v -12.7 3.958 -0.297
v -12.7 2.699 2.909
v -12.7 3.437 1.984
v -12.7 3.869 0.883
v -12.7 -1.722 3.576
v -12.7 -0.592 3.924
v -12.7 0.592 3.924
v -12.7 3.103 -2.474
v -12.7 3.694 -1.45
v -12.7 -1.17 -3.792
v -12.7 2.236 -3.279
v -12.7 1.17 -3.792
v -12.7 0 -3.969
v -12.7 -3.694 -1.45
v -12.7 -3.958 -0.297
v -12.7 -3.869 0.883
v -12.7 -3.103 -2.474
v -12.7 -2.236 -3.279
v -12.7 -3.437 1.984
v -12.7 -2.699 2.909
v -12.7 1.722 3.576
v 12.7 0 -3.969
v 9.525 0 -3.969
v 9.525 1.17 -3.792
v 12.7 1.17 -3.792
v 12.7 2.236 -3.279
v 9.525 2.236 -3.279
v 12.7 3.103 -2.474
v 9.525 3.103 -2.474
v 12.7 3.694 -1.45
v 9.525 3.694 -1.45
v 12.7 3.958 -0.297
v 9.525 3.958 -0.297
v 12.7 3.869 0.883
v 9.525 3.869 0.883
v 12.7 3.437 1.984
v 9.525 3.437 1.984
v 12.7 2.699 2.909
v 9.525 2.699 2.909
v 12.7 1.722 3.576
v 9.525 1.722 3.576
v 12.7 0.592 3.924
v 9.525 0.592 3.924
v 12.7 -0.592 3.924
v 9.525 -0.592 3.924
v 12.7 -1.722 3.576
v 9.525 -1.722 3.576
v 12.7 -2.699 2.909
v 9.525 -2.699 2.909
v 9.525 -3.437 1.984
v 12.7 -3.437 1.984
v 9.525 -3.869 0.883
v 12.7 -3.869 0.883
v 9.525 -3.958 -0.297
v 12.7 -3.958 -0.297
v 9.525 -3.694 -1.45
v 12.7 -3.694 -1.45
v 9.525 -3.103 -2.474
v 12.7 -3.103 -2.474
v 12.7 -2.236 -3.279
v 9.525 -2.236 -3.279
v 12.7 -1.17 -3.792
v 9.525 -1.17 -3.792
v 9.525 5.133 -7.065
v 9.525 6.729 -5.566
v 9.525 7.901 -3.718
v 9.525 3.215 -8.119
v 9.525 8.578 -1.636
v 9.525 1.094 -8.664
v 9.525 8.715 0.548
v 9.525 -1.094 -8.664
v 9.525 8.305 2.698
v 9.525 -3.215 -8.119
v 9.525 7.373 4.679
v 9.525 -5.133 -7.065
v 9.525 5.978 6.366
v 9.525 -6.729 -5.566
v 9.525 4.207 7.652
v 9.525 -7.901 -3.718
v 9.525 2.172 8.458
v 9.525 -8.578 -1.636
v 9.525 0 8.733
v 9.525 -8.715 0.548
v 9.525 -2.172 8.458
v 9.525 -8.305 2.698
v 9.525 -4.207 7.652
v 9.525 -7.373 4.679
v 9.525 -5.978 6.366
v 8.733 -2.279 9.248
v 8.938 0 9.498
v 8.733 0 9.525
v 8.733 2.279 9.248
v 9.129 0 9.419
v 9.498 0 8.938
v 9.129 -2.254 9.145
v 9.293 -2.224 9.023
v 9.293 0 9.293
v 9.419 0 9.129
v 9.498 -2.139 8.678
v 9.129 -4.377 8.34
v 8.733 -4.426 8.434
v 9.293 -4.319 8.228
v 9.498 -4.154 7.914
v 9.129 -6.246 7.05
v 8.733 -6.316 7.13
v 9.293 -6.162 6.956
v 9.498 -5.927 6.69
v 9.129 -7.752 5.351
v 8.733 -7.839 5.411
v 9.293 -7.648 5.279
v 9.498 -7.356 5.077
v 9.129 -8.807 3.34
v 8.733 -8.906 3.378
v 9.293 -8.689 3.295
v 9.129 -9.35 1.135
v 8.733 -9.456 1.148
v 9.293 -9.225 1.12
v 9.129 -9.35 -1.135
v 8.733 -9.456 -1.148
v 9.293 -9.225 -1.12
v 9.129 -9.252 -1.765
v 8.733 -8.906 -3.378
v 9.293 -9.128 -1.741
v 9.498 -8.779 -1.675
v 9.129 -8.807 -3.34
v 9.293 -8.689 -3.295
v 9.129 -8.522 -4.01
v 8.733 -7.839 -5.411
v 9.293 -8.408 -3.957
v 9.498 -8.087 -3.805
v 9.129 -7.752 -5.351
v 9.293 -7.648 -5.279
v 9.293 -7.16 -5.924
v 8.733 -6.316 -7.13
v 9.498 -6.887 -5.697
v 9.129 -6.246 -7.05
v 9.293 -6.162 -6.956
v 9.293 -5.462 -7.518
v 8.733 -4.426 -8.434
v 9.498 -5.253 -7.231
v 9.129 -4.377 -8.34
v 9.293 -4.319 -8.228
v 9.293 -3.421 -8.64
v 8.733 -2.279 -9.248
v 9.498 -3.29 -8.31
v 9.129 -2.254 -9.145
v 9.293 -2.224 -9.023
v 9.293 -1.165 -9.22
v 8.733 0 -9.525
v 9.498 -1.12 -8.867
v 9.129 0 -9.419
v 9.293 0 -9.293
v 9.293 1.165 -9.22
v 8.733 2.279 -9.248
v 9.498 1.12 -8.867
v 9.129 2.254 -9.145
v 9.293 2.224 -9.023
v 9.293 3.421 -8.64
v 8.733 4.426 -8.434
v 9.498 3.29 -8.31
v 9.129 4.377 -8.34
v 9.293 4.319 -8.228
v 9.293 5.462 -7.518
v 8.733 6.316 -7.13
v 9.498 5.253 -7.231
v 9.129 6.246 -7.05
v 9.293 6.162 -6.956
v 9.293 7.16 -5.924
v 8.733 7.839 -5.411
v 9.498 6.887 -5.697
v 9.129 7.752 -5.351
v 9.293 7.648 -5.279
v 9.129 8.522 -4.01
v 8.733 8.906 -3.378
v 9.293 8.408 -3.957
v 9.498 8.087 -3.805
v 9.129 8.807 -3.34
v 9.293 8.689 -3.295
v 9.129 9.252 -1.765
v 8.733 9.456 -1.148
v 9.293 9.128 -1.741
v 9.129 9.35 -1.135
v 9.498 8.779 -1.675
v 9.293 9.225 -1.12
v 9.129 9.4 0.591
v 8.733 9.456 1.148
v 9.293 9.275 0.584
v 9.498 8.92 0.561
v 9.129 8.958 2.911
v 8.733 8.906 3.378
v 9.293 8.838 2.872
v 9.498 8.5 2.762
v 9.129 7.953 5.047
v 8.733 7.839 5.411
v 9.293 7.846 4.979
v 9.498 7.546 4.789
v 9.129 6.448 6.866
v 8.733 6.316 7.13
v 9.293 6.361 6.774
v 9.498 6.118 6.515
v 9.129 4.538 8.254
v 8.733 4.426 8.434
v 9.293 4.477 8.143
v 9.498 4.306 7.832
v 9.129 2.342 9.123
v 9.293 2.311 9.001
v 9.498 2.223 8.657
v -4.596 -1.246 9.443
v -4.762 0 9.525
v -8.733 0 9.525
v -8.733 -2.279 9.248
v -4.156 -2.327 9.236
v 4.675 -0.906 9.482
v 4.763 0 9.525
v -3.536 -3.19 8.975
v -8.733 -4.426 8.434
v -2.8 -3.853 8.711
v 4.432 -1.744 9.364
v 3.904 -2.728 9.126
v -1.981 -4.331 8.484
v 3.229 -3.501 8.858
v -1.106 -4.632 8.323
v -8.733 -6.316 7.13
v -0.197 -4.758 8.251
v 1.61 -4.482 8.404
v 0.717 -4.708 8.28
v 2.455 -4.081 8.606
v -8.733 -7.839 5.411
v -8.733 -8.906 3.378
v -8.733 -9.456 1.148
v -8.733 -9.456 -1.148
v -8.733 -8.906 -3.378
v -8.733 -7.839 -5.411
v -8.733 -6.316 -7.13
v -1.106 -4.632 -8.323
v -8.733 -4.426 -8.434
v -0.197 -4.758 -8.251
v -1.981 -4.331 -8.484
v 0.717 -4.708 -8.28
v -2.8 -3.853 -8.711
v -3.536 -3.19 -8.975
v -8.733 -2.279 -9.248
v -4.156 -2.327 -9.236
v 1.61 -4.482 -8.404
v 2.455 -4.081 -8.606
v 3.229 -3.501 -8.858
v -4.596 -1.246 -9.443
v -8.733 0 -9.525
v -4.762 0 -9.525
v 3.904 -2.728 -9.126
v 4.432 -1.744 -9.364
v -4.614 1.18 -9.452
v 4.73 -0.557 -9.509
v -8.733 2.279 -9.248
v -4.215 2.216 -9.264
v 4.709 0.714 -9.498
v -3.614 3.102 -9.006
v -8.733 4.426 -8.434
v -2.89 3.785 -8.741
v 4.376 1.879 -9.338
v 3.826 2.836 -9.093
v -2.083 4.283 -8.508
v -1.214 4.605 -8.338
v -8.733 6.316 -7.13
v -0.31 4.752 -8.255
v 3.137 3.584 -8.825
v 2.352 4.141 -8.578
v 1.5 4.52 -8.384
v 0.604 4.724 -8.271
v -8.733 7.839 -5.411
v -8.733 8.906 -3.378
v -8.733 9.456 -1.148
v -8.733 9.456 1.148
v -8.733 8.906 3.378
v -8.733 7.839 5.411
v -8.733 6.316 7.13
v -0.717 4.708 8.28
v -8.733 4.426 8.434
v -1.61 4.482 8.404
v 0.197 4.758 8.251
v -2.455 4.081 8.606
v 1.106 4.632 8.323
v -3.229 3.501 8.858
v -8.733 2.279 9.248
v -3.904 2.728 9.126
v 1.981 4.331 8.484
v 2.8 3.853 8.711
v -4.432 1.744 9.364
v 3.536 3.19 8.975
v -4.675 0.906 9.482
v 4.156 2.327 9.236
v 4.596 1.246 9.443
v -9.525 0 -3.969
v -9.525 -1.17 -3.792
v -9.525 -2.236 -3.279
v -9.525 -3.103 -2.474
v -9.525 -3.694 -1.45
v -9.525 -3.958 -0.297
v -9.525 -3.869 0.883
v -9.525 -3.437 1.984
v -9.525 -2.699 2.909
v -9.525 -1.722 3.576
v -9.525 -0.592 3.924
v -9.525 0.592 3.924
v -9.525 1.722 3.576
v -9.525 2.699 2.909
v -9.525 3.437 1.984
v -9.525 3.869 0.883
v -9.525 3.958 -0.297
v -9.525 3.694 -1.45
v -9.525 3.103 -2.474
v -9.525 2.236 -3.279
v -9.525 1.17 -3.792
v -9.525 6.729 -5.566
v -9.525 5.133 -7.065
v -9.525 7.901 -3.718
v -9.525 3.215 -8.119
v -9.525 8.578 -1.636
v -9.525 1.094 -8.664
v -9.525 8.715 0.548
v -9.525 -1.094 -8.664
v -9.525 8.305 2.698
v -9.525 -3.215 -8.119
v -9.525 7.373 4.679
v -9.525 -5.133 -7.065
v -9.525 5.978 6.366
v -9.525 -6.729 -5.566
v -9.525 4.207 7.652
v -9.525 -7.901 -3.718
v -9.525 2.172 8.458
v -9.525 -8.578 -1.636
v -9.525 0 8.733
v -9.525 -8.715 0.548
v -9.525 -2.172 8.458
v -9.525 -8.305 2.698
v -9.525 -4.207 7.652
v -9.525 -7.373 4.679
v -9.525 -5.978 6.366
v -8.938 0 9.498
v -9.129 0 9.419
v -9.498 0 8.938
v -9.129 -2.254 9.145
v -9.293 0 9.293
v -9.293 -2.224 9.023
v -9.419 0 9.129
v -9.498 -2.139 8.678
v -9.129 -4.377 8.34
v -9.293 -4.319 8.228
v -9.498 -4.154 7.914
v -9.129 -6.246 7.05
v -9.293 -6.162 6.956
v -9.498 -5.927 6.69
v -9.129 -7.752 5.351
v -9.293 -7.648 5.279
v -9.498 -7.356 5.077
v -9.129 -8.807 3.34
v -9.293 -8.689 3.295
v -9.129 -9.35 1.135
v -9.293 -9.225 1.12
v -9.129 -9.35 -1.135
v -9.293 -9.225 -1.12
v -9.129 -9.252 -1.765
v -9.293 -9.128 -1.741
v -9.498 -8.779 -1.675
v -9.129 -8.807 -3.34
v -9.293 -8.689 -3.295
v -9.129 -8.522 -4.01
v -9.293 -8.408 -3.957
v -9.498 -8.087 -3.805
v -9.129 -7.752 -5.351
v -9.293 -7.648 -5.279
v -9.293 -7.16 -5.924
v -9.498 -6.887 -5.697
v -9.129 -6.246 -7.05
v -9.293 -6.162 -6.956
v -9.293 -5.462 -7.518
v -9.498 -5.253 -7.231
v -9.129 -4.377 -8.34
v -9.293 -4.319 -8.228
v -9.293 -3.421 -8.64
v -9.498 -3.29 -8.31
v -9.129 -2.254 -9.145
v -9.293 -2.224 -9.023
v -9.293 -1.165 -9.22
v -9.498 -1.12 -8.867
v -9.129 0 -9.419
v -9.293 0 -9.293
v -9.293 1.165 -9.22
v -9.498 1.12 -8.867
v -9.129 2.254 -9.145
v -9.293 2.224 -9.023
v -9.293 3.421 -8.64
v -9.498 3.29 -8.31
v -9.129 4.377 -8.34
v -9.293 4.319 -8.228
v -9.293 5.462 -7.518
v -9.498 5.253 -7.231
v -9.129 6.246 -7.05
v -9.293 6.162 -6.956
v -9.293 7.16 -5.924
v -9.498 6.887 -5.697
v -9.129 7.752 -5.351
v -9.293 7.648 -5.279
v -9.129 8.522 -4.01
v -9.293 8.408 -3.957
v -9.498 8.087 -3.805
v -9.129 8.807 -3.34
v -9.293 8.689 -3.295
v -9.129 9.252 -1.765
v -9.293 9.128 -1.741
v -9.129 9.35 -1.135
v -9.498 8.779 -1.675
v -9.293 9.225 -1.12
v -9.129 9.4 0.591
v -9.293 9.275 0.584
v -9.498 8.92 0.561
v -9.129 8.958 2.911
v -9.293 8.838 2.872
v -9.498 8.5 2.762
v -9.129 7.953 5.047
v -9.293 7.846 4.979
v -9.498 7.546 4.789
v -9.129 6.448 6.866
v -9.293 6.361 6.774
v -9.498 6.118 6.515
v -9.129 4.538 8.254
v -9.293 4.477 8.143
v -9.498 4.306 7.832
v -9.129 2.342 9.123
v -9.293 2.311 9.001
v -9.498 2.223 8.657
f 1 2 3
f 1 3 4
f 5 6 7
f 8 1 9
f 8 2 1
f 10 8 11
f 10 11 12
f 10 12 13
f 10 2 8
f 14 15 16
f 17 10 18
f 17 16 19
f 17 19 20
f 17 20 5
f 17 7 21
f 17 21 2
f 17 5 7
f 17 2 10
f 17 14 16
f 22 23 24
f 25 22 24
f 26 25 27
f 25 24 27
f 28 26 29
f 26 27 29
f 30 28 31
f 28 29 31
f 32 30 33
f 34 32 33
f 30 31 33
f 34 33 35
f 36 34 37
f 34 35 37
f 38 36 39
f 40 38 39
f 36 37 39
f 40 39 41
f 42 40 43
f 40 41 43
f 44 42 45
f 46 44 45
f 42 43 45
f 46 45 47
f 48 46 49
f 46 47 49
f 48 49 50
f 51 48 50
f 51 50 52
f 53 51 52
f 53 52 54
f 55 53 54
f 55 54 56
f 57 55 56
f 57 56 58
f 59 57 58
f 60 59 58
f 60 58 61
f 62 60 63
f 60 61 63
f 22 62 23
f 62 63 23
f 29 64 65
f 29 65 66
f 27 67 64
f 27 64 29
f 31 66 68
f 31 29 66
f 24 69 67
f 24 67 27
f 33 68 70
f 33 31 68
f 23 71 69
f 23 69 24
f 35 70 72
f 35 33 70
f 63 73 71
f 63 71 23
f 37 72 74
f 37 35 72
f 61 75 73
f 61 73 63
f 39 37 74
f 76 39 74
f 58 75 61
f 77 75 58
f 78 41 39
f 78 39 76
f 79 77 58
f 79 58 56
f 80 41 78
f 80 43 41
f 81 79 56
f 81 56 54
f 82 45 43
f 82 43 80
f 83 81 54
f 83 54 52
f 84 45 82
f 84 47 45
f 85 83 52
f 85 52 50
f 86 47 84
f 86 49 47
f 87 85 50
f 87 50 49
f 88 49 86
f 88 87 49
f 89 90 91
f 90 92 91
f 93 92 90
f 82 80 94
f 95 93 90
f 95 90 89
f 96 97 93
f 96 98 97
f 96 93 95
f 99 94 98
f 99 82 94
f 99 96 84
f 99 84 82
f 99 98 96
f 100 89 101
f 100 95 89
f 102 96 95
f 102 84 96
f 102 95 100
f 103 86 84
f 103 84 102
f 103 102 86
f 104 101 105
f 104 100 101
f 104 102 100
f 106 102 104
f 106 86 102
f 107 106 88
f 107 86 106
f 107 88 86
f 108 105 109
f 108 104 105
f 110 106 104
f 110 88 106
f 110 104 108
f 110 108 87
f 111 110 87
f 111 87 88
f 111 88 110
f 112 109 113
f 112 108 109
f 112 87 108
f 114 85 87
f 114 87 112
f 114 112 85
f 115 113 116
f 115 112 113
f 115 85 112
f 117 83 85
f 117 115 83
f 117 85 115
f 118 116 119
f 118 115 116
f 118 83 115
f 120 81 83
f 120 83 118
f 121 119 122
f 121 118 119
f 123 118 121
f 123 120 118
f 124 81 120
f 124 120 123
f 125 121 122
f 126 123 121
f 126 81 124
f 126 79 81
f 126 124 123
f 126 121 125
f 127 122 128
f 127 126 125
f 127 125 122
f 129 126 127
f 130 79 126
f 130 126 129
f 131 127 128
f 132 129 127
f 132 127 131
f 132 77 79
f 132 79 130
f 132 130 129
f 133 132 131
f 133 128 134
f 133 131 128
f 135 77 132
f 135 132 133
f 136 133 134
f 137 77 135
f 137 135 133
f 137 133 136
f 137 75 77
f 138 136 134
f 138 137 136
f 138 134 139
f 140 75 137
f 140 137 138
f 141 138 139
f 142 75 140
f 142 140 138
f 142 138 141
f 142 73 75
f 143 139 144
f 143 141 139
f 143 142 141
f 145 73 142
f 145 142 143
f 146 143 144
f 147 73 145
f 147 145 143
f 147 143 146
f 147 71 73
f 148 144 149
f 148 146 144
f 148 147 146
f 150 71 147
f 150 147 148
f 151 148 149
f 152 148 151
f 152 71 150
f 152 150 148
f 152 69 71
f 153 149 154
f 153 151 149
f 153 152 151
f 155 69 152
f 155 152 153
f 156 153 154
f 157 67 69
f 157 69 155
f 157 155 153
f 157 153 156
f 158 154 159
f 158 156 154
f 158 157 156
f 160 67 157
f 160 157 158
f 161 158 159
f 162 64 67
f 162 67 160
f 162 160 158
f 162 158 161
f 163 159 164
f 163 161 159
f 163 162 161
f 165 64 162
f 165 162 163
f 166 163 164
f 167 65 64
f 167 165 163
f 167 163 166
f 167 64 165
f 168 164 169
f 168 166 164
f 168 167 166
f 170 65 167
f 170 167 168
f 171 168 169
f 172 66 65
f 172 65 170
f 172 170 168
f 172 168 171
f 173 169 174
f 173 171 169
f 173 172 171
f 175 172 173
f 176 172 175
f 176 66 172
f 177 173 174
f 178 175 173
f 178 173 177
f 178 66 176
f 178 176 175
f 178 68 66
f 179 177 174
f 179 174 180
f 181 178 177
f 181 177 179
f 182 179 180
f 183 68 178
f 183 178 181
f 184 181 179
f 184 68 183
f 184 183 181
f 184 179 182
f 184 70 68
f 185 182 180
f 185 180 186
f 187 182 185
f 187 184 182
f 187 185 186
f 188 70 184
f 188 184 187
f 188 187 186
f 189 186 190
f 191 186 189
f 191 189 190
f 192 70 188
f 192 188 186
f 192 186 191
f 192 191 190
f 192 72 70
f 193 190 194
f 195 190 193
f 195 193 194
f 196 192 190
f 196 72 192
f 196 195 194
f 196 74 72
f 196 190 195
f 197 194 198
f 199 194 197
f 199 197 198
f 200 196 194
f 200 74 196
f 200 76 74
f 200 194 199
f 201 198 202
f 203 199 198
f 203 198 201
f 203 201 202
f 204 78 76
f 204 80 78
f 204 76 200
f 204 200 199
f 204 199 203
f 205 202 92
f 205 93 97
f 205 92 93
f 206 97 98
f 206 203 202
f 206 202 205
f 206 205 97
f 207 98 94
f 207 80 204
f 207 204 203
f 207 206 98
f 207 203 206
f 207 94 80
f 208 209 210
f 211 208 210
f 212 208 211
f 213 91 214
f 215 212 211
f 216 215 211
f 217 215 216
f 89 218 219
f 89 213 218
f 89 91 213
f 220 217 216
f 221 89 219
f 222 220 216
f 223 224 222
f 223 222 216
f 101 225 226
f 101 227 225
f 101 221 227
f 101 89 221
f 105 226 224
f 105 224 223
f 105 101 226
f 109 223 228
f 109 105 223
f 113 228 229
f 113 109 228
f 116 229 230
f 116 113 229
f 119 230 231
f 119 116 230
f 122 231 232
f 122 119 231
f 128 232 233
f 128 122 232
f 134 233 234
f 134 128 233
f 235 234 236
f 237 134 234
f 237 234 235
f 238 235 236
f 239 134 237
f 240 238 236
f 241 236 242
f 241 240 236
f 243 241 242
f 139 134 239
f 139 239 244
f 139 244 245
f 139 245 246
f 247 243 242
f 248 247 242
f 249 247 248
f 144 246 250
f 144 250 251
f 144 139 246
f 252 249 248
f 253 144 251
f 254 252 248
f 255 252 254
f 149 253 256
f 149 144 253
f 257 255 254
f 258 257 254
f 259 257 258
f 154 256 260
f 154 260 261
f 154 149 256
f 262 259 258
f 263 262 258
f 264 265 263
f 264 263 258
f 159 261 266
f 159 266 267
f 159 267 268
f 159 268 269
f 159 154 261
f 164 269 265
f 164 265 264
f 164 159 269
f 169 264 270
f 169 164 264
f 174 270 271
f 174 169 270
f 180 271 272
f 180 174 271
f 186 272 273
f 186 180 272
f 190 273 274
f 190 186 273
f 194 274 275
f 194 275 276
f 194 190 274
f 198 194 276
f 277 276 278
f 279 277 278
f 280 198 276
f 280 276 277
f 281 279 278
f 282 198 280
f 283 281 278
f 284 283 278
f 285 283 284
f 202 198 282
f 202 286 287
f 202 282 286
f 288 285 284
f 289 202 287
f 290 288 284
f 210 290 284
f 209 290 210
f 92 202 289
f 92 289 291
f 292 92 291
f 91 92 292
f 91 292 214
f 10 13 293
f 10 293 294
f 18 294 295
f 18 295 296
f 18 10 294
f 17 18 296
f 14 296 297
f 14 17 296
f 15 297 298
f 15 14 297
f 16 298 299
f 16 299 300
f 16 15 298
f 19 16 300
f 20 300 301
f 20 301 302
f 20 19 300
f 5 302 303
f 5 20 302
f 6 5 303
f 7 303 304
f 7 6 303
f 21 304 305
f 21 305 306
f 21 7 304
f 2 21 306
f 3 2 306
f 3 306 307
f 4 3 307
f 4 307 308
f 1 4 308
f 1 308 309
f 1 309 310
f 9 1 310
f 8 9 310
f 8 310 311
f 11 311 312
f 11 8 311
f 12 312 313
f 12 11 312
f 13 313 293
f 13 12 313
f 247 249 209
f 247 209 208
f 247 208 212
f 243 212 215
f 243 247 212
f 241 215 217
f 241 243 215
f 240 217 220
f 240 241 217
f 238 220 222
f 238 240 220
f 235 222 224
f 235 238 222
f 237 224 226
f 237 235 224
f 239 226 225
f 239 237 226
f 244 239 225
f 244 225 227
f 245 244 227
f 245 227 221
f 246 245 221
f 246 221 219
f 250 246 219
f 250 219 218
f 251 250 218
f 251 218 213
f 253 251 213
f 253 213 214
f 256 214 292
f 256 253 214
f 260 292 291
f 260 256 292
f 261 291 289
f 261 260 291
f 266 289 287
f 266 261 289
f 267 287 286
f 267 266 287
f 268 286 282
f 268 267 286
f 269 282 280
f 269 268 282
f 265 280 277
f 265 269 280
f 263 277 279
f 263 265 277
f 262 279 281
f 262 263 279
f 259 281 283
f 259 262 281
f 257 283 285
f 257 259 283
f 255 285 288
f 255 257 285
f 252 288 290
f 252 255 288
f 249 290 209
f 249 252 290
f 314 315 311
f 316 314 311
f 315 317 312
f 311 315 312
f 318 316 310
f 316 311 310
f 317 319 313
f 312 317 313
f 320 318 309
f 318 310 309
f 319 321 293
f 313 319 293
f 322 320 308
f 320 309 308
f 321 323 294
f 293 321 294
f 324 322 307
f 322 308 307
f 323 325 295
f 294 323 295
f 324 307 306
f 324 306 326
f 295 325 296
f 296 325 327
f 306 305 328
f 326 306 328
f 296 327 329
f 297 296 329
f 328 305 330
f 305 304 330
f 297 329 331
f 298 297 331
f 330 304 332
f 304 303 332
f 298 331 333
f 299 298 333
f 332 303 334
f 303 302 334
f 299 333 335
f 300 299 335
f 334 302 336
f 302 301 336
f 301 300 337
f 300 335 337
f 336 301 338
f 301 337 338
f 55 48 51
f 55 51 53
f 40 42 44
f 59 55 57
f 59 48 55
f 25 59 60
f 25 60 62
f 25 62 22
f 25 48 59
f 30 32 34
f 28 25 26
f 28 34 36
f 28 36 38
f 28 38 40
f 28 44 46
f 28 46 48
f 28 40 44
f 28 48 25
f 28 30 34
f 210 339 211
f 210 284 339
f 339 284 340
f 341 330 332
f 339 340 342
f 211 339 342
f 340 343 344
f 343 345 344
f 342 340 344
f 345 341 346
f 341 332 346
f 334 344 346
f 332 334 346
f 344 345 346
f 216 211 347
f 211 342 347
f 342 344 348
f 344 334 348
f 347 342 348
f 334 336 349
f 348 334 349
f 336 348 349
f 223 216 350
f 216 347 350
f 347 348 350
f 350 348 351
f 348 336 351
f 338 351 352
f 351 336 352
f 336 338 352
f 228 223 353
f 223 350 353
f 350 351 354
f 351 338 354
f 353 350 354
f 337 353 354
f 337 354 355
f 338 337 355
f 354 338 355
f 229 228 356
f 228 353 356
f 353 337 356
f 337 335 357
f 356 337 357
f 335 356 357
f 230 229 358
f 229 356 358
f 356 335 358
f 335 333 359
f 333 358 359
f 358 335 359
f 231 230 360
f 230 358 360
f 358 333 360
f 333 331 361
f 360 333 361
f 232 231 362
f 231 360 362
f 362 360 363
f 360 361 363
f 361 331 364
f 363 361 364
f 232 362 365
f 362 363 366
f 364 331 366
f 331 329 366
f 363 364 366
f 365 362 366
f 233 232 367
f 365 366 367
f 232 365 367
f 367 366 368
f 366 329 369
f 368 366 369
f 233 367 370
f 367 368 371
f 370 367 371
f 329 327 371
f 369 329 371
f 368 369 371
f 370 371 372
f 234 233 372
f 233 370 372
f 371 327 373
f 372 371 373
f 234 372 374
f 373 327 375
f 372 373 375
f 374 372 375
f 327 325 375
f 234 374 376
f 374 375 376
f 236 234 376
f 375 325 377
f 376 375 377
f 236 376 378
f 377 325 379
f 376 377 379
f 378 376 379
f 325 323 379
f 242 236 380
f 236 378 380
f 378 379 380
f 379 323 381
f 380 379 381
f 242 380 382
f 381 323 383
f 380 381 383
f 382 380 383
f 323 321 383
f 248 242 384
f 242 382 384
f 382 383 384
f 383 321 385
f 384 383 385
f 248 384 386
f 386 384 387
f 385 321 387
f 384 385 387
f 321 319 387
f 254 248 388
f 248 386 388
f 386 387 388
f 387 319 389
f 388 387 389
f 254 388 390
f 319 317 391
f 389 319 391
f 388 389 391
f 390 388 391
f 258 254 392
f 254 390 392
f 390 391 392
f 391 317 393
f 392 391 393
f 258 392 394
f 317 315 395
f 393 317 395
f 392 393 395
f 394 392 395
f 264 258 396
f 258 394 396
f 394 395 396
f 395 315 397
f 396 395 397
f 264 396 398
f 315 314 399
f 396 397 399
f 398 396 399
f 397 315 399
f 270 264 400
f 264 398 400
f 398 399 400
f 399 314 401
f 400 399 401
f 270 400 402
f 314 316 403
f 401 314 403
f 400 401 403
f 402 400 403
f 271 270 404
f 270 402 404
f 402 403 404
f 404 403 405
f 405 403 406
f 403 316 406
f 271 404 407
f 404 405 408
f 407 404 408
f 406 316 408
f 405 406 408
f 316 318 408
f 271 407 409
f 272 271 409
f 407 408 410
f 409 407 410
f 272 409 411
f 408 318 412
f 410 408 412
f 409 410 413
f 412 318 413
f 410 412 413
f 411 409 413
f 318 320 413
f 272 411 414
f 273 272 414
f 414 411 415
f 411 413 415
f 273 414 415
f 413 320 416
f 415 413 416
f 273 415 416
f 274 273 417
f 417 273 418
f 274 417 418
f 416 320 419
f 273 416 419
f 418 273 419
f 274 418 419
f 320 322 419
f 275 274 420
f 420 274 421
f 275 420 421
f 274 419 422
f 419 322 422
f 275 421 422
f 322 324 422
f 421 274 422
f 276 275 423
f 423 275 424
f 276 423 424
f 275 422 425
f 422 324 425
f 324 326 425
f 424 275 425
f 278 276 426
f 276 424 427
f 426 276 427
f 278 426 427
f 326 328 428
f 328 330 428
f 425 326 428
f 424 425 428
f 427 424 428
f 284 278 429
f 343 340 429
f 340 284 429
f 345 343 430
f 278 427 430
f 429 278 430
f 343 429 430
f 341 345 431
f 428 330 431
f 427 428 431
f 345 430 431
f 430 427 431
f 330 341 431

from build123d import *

# Parameters (mm, degrees)
SKETCH1_R               = 9.525
BOSS_EXTRUDE1_DEPTH     = 9.525
SKETCH2_R               = 3.96875
BOSS_EXTRUDE2_DEPTH     = 3.175
FILLET1_R               = 0.79248
BOSS_EXTRUDE3_START     = 3.175
SKETCH3_R               = 3.96875
BOSS_EXTRUDE3_DEPTH     = 3.175
CUT_EXTRUDE1_DEPTH      = 19.513272318
CUT_EXTRUDE1_DEPTH_BACK = 19.513272318
SKETCH13_R              = 4.7625


with BuildPart() as part:
    # Sketch1 → Boss-Extrude1 (new, symmetric)
    with BuildSketch(Plane(origin=(0, 0, 0), x_dir=(0, 0, -1), z_dir=(1, 0, 0))):
        with Locations(Location((0, 0, 0), (0, 0, 180))):
            Circle(SKETCH1_R)
    extrude(amount=BOSS_EXTRUDE1_DEPTH, both=True)

    # Sketch2 → Boss-Extrude2 (add)
    with BuildSketch(Plane(origin=(9.525, 0, 0), x_dir=(0, 0, -1), z_dir=(1, 0, 0))):
        Circle(SKETCH2_R)
    extrude(amount=BOSS_EXTRUDE2_DEPTH)

    # Fillet1
    fillet1_edges = [part.edges().sort_by_distance(p)[0] for p in [
        (-9.525, 0, -9.525),
        (9.525, 0, -9.525),
    ]]
    fillet(fillet1_edges, radius=FILLET1_R)

    # Sketch3 → Boss-Extrude3 (add)
    with BuildSketch(Plane.ZY.offset(9.525).offset(BOSS_EXTRUDE3_START)):
        with Locations(Location((0, 0, 0), (0, 0, 180))):
            Circle(SKETCH3_R)
    extrude(amount=-BOSS_EXTRUDE3_DEPTH)

    # Sketch13 → Cut-Extrude1 (cut, two sides: drawn at the far end of the back side and taken through both)
    with BuildSketch(Plane.XY.offset(-CUT_EXTRUDE1_DEPTH_BACK)):
        with Locations(Location((0, 0, 0), (0, 0, 180))):
            Circle(SKETCH13_R)
    extrude(amount=CUT_EXTRUDE1_DEPTH + CUT_EXTRUDE1_DEPTH_BACK, mode=Mode.SUBTRACT)


solid = part.part
